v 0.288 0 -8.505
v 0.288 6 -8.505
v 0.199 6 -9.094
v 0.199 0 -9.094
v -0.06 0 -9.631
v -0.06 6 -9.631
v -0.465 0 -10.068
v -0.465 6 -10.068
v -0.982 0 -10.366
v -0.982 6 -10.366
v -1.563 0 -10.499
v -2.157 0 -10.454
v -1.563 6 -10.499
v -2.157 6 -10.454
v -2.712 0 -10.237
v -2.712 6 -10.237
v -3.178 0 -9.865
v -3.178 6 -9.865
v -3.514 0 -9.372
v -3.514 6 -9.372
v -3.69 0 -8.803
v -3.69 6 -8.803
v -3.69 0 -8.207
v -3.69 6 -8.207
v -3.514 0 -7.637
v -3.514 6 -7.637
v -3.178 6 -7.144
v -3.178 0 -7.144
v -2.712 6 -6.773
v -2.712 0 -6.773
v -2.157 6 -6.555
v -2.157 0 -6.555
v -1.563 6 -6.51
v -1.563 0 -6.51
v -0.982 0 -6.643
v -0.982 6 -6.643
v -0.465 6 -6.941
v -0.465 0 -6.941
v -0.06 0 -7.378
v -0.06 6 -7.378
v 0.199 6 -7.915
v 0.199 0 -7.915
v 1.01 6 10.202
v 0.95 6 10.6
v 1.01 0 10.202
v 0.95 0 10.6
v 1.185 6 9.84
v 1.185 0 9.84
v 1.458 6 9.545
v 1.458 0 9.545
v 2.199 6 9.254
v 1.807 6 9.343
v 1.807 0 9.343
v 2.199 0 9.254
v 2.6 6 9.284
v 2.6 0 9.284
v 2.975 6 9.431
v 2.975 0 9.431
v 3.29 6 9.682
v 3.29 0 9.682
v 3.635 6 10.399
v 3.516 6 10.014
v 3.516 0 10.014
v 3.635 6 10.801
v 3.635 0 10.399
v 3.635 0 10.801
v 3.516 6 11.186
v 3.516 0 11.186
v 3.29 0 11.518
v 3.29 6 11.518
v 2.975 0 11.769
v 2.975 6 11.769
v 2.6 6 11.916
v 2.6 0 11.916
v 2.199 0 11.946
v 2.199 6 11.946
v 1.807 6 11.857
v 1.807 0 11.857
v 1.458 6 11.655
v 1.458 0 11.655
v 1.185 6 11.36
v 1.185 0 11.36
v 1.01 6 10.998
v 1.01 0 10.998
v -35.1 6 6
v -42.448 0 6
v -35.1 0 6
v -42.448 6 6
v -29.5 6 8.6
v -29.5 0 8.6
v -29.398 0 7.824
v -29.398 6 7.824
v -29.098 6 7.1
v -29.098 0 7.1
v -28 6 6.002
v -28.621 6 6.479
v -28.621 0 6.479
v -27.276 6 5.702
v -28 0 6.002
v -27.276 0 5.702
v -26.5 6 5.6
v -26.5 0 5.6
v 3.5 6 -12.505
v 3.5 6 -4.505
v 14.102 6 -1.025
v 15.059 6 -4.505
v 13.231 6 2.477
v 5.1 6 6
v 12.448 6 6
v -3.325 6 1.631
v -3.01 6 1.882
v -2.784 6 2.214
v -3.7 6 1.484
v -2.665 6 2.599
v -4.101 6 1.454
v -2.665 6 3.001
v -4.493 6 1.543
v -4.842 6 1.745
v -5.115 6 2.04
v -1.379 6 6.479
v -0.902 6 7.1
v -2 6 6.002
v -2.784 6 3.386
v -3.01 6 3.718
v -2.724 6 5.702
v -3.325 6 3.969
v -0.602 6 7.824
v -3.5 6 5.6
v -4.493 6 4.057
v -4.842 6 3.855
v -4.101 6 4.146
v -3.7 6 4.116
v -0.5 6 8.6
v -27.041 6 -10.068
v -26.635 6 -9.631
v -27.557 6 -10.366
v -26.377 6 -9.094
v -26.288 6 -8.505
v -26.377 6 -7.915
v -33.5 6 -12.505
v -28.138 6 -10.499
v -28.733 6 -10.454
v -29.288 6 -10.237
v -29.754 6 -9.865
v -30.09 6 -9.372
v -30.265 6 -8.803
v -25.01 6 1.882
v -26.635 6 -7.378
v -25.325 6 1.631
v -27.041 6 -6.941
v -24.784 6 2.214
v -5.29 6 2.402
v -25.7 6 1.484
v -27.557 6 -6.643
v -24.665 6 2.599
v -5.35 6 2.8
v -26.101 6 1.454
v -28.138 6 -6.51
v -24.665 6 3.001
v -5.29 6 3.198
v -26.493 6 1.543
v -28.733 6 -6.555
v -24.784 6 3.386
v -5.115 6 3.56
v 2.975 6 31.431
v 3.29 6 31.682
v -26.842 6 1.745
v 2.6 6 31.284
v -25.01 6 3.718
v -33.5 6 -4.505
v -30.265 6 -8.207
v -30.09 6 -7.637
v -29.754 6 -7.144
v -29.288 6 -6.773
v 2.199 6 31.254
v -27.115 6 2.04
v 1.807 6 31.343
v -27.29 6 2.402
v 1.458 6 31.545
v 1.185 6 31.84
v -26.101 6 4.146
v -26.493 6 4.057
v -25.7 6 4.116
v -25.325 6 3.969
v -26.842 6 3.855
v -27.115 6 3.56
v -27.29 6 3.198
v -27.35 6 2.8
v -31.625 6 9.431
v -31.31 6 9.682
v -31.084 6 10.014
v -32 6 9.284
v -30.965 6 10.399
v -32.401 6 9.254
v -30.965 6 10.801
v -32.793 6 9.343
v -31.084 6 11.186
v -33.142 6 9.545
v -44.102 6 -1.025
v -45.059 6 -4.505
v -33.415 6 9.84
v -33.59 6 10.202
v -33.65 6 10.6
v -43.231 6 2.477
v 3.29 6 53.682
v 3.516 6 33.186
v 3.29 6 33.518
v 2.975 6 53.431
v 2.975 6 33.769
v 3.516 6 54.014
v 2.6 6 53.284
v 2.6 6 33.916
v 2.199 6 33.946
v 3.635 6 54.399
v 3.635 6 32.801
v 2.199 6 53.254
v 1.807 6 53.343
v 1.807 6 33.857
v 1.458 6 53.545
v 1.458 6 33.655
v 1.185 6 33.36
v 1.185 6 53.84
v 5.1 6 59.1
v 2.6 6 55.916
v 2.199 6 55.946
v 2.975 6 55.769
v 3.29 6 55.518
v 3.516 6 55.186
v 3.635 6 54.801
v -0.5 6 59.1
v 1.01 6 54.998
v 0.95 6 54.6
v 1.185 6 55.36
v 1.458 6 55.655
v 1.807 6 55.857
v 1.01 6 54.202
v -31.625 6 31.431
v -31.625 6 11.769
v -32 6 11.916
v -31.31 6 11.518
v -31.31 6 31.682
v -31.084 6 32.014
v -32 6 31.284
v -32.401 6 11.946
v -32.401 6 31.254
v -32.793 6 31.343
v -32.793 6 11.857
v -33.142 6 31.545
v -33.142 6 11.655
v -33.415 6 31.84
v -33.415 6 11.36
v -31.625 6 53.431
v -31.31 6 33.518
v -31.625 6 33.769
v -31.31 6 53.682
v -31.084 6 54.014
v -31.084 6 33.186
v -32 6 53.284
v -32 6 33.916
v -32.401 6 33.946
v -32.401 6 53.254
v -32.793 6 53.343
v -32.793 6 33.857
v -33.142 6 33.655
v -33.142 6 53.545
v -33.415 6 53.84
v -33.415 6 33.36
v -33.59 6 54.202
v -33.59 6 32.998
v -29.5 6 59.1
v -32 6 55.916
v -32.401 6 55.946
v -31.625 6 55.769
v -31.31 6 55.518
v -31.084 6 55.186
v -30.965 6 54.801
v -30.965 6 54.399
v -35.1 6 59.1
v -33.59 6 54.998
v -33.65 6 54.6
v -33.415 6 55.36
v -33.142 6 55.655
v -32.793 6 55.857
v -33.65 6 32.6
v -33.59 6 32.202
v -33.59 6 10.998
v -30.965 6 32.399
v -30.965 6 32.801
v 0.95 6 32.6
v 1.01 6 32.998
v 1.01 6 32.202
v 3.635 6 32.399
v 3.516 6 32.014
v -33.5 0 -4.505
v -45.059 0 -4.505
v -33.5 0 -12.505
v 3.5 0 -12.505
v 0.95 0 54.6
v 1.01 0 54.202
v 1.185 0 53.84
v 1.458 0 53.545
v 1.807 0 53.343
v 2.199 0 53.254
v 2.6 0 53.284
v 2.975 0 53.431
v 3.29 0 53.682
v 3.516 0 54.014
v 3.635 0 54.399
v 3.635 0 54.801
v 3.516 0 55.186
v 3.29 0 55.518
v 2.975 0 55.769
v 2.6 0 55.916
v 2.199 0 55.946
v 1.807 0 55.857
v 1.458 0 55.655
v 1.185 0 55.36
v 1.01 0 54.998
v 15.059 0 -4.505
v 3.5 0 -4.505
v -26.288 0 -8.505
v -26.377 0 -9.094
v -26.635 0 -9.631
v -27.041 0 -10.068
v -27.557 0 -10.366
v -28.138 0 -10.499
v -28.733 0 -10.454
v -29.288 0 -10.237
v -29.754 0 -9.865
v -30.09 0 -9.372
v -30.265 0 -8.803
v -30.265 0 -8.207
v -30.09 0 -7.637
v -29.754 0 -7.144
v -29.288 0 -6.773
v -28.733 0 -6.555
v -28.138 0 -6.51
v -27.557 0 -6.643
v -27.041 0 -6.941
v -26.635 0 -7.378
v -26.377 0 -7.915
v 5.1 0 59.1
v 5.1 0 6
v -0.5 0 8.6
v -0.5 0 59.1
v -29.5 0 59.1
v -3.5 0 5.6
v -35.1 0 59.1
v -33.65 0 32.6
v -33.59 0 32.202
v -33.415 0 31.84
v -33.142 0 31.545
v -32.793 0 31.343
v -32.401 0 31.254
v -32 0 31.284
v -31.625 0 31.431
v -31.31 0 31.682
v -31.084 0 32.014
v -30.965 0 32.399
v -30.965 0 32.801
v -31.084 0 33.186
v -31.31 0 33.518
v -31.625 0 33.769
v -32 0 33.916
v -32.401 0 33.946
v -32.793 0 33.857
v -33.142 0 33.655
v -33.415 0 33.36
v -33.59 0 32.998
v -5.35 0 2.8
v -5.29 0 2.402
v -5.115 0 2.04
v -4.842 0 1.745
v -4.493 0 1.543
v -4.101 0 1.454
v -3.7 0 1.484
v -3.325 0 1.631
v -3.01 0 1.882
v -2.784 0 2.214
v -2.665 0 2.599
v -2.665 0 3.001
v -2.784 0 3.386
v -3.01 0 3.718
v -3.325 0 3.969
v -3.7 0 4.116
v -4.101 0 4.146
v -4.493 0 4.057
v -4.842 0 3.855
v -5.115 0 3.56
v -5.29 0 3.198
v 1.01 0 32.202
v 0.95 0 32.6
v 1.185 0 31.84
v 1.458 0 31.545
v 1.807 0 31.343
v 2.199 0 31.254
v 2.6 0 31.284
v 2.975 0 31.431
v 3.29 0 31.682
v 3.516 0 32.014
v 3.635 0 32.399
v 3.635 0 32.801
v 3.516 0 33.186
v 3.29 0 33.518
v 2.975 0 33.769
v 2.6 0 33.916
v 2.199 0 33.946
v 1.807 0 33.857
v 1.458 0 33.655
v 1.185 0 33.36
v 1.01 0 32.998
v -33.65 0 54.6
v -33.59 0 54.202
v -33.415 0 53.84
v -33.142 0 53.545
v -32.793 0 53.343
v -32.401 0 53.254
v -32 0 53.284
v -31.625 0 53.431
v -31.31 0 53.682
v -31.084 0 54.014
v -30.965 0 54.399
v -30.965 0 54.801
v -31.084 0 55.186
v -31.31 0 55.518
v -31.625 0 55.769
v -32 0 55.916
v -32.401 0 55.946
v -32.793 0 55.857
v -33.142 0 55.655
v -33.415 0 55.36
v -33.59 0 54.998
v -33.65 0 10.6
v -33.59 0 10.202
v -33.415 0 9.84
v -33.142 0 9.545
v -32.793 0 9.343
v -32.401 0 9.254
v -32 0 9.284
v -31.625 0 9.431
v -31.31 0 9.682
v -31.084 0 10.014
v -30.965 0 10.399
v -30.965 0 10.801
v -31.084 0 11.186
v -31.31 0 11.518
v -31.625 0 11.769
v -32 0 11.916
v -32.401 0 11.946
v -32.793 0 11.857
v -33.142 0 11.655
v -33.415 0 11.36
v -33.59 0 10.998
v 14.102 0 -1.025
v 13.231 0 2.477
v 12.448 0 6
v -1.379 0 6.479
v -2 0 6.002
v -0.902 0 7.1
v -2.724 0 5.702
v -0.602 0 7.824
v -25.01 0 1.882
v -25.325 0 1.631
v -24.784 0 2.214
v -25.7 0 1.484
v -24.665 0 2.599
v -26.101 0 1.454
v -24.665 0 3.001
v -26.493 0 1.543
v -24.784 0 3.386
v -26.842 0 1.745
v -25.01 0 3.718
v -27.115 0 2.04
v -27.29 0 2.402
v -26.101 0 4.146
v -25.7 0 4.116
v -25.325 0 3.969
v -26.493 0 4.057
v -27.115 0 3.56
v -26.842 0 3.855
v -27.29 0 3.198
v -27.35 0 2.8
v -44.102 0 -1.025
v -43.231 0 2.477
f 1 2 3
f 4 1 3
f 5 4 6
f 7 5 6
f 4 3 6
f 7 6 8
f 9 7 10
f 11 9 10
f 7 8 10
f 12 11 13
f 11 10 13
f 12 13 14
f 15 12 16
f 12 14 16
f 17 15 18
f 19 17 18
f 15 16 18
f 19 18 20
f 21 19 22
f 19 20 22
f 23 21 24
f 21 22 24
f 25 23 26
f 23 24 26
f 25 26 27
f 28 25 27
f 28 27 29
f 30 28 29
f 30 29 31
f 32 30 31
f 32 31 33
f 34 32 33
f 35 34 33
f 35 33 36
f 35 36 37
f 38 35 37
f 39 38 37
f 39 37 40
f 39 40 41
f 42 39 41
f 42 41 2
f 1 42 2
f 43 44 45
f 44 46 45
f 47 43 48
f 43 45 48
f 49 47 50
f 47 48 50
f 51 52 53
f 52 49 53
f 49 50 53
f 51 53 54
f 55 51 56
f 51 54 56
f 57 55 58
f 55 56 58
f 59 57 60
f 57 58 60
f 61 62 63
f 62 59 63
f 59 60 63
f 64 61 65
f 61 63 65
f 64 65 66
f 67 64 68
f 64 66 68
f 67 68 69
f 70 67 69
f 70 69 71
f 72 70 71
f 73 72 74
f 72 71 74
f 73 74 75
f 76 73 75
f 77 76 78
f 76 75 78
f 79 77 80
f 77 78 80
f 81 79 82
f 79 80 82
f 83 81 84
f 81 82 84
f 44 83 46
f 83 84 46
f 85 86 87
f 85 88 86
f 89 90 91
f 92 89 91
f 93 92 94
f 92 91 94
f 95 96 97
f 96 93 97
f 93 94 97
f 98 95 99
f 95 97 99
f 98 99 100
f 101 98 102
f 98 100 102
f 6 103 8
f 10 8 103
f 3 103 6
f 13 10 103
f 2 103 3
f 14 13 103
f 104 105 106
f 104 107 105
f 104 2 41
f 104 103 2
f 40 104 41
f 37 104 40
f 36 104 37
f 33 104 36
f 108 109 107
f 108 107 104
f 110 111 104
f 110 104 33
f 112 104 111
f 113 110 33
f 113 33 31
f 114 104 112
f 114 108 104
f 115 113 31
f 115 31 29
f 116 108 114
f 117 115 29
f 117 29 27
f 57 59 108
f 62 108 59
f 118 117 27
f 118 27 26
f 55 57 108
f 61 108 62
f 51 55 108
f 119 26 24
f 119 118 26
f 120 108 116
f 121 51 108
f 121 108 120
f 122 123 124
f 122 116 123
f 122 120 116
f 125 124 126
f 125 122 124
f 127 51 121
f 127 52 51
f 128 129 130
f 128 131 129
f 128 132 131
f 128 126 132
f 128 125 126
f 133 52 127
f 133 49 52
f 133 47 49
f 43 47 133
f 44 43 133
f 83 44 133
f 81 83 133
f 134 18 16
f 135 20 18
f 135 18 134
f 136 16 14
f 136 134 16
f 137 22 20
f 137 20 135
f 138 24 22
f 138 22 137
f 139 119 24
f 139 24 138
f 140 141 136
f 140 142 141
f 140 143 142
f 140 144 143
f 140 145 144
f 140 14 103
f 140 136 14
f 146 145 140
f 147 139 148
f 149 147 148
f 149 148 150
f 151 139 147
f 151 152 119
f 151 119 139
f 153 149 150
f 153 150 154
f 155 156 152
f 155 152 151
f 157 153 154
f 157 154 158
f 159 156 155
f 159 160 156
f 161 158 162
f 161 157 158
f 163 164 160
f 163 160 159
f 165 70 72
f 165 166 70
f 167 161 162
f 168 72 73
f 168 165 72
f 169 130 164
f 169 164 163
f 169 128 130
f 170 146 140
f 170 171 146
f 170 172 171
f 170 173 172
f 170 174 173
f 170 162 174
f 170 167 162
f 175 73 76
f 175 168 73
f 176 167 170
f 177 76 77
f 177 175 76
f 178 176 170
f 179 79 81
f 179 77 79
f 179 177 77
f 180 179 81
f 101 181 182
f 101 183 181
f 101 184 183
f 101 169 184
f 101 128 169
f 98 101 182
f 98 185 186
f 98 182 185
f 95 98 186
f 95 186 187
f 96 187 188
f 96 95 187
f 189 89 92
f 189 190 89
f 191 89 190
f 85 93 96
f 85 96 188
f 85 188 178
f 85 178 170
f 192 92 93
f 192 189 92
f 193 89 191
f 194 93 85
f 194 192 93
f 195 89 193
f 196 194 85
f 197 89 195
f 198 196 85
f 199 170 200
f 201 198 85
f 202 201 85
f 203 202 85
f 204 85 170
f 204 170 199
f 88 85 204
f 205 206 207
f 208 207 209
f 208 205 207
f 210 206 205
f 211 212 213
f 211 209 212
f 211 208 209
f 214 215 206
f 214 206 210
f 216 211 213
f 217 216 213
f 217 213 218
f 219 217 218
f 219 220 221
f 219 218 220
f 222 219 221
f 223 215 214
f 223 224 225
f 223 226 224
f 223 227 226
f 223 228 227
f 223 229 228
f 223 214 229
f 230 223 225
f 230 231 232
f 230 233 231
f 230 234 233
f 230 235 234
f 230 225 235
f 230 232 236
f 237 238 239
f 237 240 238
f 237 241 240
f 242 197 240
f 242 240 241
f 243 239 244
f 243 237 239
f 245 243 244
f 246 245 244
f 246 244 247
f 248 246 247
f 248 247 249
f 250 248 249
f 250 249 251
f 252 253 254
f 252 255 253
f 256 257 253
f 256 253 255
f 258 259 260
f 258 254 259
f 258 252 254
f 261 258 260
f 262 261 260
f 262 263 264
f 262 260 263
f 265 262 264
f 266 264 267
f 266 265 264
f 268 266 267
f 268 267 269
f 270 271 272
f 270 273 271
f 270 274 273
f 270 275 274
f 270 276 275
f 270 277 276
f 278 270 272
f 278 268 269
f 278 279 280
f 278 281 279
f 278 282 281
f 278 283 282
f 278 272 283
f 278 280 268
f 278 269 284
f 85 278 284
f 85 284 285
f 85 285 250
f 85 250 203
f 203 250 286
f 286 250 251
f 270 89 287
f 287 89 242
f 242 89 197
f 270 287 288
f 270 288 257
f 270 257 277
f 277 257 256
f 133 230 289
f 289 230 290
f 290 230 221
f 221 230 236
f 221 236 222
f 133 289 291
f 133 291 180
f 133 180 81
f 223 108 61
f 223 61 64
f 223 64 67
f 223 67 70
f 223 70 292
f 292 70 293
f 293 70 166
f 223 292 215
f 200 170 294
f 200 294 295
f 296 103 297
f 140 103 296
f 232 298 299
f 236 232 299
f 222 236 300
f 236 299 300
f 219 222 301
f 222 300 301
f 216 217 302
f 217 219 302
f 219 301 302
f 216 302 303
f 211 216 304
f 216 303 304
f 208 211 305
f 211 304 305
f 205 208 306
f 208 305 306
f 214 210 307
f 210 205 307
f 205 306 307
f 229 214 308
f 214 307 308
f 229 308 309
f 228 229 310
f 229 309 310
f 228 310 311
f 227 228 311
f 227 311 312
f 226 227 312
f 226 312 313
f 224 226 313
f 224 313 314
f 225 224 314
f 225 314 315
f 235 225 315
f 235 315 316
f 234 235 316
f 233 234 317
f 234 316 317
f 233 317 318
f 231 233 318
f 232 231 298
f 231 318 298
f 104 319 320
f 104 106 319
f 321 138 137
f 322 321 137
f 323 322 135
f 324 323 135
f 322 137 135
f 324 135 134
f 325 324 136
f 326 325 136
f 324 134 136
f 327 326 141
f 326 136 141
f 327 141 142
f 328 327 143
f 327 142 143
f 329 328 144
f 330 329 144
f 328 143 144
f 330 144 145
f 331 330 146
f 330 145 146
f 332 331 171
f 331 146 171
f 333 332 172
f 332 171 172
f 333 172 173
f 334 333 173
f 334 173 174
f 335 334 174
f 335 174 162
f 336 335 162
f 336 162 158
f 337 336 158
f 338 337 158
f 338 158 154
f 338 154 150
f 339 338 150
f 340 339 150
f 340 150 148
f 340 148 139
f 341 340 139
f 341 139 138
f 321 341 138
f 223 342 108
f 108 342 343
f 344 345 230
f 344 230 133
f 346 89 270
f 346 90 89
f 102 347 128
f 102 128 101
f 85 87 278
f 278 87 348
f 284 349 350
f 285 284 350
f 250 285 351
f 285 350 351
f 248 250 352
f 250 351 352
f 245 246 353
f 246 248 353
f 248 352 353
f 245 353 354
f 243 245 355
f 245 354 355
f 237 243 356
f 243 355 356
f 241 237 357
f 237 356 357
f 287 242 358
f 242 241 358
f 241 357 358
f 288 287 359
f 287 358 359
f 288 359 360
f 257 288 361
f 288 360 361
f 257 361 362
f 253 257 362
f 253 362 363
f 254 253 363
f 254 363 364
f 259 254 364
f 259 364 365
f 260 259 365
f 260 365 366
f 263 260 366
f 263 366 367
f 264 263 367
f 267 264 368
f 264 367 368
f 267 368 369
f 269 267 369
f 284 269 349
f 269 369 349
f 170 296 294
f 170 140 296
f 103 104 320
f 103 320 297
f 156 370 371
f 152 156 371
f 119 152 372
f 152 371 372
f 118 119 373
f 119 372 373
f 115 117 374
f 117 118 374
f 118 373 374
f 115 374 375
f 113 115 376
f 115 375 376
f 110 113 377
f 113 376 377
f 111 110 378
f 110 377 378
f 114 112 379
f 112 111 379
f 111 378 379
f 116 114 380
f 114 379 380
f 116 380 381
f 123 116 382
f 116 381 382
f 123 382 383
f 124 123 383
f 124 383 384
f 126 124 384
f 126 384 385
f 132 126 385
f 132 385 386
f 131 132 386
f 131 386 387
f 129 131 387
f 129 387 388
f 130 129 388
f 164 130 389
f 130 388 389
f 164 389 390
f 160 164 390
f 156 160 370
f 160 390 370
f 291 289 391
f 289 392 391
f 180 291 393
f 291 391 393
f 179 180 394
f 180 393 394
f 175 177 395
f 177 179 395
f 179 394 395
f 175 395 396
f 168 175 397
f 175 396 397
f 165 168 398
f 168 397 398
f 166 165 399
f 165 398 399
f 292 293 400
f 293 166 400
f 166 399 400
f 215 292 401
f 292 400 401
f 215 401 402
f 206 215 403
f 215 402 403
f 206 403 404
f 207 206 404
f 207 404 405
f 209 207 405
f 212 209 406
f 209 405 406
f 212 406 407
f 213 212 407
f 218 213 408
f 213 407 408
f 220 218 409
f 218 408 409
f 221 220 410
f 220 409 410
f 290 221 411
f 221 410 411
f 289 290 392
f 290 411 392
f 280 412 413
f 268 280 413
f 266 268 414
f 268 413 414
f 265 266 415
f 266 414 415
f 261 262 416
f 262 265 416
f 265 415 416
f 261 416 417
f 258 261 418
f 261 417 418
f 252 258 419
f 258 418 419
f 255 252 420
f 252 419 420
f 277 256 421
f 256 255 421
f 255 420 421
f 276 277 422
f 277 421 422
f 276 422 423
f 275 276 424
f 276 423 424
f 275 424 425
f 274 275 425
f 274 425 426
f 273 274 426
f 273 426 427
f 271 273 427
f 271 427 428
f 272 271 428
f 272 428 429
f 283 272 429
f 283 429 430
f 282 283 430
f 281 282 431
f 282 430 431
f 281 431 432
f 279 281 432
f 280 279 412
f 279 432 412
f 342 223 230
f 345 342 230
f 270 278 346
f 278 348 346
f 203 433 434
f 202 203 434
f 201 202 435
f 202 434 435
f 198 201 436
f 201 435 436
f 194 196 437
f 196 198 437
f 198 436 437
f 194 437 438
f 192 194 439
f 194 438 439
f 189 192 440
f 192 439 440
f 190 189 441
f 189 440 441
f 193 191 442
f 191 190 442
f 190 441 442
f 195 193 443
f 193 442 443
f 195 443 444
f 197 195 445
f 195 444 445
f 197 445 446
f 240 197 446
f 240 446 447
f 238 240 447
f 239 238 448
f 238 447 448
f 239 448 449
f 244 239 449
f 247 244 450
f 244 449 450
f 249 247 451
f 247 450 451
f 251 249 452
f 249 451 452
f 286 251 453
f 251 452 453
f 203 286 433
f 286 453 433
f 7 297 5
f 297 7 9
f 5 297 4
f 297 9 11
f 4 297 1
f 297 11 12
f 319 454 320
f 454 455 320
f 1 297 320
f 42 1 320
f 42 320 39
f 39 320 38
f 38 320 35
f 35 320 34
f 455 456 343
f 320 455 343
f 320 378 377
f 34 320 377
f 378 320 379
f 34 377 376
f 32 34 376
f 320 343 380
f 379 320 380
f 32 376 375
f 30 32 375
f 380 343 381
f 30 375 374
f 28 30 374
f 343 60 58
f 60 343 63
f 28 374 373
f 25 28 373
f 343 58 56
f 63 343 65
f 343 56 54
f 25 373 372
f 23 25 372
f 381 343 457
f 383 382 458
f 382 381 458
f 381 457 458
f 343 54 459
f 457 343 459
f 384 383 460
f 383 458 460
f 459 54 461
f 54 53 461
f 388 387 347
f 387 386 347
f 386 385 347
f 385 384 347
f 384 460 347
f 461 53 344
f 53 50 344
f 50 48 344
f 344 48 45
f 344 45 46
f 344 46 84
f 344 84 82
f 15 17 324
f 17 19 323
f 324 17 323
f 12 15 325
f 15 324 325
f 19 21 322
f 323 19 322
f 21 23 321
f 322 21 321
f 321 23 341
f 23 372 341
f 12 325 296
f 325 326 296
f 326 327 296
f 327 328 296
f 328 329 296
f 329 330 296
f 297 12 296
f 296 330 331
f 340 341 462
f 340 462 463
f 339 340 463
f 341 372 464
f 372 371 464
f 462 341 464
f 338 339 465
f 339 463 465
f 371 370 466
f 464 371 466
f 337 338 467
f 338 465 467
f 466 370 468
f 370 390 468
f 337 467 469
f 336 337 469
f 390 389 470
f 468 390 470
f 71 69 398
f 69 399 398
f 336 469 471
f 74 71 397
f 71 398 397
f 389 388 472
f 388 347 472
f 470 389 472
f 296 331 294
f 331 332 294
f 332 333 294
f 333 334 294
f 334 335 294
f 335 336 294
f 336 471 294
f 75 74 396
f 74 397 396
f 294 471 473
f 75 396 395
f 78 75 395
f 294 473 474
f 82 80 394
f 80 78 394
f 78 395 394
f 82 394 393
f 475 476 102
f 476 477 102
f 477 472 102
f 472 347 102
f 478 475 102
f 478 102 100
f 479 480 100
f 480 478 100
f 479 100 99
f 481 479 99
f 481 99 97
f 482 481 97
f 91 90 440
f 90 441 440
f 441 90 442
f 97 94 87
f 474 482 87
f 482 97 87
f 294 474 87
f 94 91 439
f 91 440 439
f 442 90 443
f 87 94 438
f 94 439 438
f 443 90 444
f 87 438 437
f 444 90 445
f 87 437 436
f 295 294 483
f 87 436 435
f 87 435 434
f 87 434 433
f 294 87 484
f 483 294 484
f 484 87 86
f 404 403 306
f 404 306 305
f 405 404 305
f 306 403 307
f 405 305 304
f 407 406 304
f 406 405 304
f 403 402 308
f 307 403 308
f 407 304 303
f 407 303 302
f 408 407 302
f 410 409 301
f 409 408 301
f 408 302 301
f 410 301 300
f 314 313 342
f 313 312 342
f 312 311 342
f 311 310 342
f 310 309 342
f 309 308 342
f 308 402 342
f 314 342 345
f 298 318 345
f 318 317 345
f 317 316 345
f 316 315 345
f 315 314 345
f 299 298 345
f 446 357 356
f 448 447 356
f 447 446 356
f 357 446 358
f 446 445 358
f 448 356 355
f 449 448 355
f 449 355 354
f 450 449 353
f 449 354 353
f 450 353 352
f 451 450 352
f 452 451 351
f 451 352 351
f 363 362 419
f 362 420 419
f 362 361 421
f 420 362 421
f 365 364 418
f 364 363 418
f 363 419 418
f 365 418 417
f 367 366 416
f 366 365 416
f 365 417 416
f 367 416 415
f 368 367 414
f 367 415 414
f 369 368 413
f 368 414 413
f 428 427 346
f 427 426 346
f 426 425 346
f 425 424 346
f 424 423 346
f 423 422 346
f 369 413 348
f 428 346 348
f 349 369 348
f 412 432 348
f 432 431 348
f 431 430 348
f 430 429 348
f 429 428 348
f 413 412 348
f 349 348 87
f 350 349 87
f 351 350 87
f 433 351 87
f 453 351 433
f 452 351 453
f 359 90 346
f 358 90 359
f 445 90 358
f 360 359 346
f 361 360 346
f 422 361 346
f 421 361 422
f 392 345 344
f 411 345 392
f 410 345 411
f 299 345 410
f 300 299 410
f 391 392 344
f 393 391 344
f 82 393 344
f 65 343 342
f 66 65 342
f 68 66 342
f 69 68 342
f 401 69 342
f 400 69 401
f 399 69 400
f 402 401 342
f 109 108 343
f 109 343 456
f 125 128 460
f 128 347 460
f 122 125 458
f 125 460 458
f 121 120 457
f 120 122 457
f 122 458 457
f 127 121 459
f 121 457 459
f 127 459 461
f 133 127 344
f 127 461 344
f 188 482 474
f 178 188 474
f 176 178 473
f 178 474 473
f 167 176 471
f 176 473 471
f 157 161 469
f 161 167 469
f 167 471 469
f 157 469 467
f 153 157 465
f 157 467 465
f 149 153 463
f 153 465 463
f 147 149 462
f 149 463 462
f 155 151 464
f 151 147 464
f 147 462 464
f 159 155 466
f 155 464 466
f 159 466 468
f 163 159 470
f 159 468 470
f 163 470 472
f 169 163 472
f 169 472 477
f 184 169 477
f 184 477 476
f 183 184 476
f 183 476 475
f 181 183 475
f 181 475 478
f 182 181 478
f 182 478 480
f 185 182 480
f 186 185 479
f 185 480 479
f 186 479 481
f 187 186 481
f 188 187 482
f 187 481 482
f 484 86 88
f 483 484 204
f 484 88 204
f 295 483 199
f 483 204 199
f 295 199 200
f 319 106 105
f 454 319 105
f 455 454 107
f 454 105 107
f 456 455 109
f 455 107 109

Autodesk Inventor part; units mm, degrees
ref_plane "YZ Plane" through (0, 0, 0) normal (1, 0, 0) x (0, 1, 0)
ref_plane "XZ Plane" through (0, 0, 0) normal (0, 1, 0) x (-1, 0, 0)
ref_plane "XY Plane" through (0, 0, 0) normal (0, 0, 1) x (1, 0, 0)
sketch "Эскиз1" plane through (0, 0, 0) normal (0, 1, 0) x (-1, 0, 0)
  arc A0 (3.5, 65.1) -> (0.5, 62.1) centre (3.5, 62.1) ccw
  line L0 (0, 65.1) -> (3.5, 65.1)
  line L1 (0, 65.1) -> (-5.1, 59.1)
  line L2 (-5.1, 59.1) -> (-5.1, 6)
  line L3 (-5.1, 6) -> (0, 0)
  line L4 (0, 0) -> (30, 0)
  line L5 (30, 0) -> (35.1, 6)
  line L6 (35.1, 6) -> (35.1, 59.1)
  line L7 (35.1, 59.1) -> (30, 65.1)
  line L8 (26.5, 65.1) -> (30, 65.1)
  arc A1 (29.5, 62.1) -> (26.5, 65.1) centre (26.5, 62.1) ccw
  line L9 (29.5, 8.6) -> (29.5, 62.1)
  arc A2 (26.5, 5.6) -> (29.5, 8.6) centre (26.5, 8.6) ccw
  line L10 (3.5, 5.6) -> (26.5, 5.6)
  arc A3 (0.5, 8.6) -> (3.5, 5.6) centre (3.5, 8.6) ccw
  line L11 (0.5, 62.1) -> (0.5, 8.6)
  circle A4 centre (4, 2.8) radius 1.35
  circle A5 centre (-2.3, 10.6) radius 1.35
  circle A6 centre (-2.3, 32.6) radius 1.35
  circle A7 centre (-2.3, 54.6) radius 1.35
  circle A8 centre (26, 2.8) radius 1.35
  circle A9 centre (32.3, 10.6) radius 1.35
  circle A10 centre (32.3, 32.6) radius 1.35
  circle A11 centre (32.3, 54.6) radius 1.35
  line L12 (26.5, 65.1) -> (3.5, 65.1)
  line L13 (35.1, 6) -> (35.1, 0)
  line L14 (35.1, 0) -> (30, 0)
  line L15 (-5.1, 6) -> (-5.1, 0)
  line L16 (-5.1, 0) -> (0, 0)
  line L17 (35.1, 0) -> (-5.1, 0)
  line L18 (-5.1, 0) -> (-5.1, 65.1)
  line L19 (-5.1, 65.1) -> (35.1, 65.1)
  line L20 (35.1, 65.1) -> (35.1, 0)
  line L21 (-5.1, 59.1) -> (0.5, 59.1)
  line L22 (35.1, 59.1) -> (29.5, 59.1)
  point P0 (15, 50.6)
extrude "Выдавливание1" add sketch "Эскиз1" along normal blind 6 contours L11 A3 L10 A2 L9 L22 L6 L5 L4 L3 L2 L21
sketch "Эскиз2" plane through (0, 6, 0) normal (0, 1, 0) x (1, 0, 0)
  circle A0 centre (-1.7123, 8.5046) radius 2
  circle A1 centre (-28.2877, 8.5046) radius 2
  line L0 (3.5, 12.5046) -> (-33.5, 12.5046)
  line L1 (-33.5, 12.5046) -> (-33.5, 4.5046)
  line L2 (-33.5, 4.5046) -> (-45.0593, 4.5046)
  arc A2 (-42.448, -6) -> (-45.0593, 4.5046) centre (-184.8586, -35.8244) ccw
  line L3 (-42.448, -6) -> (-35.1, -6)
  line L4 (-35.1, -6) -> (-30, 0)
  line L5 (-30, 0) -> (0, 0)
  line L6 (0, 0) -> (5.1, -6)
  line L7 (5.1, -6) -> (12.448, -6)
  arc A3 (15.0593, 4.5046) -> (12.448, -6) centre (154.8586, -35.8244) ccw
  line L8 (15.0593, 4.5046) -> (3.5, 4.5046)
  line L9 (3.5, 4.5046) -> (3.5, 12.5046)
  point P0 (0, 0)
  point P1 (0, 0)
extrude "Выдавливание2" add sketch "Эскиз2" against normal blind 6
properties part number "000.402 - Прижим сервомотора"
